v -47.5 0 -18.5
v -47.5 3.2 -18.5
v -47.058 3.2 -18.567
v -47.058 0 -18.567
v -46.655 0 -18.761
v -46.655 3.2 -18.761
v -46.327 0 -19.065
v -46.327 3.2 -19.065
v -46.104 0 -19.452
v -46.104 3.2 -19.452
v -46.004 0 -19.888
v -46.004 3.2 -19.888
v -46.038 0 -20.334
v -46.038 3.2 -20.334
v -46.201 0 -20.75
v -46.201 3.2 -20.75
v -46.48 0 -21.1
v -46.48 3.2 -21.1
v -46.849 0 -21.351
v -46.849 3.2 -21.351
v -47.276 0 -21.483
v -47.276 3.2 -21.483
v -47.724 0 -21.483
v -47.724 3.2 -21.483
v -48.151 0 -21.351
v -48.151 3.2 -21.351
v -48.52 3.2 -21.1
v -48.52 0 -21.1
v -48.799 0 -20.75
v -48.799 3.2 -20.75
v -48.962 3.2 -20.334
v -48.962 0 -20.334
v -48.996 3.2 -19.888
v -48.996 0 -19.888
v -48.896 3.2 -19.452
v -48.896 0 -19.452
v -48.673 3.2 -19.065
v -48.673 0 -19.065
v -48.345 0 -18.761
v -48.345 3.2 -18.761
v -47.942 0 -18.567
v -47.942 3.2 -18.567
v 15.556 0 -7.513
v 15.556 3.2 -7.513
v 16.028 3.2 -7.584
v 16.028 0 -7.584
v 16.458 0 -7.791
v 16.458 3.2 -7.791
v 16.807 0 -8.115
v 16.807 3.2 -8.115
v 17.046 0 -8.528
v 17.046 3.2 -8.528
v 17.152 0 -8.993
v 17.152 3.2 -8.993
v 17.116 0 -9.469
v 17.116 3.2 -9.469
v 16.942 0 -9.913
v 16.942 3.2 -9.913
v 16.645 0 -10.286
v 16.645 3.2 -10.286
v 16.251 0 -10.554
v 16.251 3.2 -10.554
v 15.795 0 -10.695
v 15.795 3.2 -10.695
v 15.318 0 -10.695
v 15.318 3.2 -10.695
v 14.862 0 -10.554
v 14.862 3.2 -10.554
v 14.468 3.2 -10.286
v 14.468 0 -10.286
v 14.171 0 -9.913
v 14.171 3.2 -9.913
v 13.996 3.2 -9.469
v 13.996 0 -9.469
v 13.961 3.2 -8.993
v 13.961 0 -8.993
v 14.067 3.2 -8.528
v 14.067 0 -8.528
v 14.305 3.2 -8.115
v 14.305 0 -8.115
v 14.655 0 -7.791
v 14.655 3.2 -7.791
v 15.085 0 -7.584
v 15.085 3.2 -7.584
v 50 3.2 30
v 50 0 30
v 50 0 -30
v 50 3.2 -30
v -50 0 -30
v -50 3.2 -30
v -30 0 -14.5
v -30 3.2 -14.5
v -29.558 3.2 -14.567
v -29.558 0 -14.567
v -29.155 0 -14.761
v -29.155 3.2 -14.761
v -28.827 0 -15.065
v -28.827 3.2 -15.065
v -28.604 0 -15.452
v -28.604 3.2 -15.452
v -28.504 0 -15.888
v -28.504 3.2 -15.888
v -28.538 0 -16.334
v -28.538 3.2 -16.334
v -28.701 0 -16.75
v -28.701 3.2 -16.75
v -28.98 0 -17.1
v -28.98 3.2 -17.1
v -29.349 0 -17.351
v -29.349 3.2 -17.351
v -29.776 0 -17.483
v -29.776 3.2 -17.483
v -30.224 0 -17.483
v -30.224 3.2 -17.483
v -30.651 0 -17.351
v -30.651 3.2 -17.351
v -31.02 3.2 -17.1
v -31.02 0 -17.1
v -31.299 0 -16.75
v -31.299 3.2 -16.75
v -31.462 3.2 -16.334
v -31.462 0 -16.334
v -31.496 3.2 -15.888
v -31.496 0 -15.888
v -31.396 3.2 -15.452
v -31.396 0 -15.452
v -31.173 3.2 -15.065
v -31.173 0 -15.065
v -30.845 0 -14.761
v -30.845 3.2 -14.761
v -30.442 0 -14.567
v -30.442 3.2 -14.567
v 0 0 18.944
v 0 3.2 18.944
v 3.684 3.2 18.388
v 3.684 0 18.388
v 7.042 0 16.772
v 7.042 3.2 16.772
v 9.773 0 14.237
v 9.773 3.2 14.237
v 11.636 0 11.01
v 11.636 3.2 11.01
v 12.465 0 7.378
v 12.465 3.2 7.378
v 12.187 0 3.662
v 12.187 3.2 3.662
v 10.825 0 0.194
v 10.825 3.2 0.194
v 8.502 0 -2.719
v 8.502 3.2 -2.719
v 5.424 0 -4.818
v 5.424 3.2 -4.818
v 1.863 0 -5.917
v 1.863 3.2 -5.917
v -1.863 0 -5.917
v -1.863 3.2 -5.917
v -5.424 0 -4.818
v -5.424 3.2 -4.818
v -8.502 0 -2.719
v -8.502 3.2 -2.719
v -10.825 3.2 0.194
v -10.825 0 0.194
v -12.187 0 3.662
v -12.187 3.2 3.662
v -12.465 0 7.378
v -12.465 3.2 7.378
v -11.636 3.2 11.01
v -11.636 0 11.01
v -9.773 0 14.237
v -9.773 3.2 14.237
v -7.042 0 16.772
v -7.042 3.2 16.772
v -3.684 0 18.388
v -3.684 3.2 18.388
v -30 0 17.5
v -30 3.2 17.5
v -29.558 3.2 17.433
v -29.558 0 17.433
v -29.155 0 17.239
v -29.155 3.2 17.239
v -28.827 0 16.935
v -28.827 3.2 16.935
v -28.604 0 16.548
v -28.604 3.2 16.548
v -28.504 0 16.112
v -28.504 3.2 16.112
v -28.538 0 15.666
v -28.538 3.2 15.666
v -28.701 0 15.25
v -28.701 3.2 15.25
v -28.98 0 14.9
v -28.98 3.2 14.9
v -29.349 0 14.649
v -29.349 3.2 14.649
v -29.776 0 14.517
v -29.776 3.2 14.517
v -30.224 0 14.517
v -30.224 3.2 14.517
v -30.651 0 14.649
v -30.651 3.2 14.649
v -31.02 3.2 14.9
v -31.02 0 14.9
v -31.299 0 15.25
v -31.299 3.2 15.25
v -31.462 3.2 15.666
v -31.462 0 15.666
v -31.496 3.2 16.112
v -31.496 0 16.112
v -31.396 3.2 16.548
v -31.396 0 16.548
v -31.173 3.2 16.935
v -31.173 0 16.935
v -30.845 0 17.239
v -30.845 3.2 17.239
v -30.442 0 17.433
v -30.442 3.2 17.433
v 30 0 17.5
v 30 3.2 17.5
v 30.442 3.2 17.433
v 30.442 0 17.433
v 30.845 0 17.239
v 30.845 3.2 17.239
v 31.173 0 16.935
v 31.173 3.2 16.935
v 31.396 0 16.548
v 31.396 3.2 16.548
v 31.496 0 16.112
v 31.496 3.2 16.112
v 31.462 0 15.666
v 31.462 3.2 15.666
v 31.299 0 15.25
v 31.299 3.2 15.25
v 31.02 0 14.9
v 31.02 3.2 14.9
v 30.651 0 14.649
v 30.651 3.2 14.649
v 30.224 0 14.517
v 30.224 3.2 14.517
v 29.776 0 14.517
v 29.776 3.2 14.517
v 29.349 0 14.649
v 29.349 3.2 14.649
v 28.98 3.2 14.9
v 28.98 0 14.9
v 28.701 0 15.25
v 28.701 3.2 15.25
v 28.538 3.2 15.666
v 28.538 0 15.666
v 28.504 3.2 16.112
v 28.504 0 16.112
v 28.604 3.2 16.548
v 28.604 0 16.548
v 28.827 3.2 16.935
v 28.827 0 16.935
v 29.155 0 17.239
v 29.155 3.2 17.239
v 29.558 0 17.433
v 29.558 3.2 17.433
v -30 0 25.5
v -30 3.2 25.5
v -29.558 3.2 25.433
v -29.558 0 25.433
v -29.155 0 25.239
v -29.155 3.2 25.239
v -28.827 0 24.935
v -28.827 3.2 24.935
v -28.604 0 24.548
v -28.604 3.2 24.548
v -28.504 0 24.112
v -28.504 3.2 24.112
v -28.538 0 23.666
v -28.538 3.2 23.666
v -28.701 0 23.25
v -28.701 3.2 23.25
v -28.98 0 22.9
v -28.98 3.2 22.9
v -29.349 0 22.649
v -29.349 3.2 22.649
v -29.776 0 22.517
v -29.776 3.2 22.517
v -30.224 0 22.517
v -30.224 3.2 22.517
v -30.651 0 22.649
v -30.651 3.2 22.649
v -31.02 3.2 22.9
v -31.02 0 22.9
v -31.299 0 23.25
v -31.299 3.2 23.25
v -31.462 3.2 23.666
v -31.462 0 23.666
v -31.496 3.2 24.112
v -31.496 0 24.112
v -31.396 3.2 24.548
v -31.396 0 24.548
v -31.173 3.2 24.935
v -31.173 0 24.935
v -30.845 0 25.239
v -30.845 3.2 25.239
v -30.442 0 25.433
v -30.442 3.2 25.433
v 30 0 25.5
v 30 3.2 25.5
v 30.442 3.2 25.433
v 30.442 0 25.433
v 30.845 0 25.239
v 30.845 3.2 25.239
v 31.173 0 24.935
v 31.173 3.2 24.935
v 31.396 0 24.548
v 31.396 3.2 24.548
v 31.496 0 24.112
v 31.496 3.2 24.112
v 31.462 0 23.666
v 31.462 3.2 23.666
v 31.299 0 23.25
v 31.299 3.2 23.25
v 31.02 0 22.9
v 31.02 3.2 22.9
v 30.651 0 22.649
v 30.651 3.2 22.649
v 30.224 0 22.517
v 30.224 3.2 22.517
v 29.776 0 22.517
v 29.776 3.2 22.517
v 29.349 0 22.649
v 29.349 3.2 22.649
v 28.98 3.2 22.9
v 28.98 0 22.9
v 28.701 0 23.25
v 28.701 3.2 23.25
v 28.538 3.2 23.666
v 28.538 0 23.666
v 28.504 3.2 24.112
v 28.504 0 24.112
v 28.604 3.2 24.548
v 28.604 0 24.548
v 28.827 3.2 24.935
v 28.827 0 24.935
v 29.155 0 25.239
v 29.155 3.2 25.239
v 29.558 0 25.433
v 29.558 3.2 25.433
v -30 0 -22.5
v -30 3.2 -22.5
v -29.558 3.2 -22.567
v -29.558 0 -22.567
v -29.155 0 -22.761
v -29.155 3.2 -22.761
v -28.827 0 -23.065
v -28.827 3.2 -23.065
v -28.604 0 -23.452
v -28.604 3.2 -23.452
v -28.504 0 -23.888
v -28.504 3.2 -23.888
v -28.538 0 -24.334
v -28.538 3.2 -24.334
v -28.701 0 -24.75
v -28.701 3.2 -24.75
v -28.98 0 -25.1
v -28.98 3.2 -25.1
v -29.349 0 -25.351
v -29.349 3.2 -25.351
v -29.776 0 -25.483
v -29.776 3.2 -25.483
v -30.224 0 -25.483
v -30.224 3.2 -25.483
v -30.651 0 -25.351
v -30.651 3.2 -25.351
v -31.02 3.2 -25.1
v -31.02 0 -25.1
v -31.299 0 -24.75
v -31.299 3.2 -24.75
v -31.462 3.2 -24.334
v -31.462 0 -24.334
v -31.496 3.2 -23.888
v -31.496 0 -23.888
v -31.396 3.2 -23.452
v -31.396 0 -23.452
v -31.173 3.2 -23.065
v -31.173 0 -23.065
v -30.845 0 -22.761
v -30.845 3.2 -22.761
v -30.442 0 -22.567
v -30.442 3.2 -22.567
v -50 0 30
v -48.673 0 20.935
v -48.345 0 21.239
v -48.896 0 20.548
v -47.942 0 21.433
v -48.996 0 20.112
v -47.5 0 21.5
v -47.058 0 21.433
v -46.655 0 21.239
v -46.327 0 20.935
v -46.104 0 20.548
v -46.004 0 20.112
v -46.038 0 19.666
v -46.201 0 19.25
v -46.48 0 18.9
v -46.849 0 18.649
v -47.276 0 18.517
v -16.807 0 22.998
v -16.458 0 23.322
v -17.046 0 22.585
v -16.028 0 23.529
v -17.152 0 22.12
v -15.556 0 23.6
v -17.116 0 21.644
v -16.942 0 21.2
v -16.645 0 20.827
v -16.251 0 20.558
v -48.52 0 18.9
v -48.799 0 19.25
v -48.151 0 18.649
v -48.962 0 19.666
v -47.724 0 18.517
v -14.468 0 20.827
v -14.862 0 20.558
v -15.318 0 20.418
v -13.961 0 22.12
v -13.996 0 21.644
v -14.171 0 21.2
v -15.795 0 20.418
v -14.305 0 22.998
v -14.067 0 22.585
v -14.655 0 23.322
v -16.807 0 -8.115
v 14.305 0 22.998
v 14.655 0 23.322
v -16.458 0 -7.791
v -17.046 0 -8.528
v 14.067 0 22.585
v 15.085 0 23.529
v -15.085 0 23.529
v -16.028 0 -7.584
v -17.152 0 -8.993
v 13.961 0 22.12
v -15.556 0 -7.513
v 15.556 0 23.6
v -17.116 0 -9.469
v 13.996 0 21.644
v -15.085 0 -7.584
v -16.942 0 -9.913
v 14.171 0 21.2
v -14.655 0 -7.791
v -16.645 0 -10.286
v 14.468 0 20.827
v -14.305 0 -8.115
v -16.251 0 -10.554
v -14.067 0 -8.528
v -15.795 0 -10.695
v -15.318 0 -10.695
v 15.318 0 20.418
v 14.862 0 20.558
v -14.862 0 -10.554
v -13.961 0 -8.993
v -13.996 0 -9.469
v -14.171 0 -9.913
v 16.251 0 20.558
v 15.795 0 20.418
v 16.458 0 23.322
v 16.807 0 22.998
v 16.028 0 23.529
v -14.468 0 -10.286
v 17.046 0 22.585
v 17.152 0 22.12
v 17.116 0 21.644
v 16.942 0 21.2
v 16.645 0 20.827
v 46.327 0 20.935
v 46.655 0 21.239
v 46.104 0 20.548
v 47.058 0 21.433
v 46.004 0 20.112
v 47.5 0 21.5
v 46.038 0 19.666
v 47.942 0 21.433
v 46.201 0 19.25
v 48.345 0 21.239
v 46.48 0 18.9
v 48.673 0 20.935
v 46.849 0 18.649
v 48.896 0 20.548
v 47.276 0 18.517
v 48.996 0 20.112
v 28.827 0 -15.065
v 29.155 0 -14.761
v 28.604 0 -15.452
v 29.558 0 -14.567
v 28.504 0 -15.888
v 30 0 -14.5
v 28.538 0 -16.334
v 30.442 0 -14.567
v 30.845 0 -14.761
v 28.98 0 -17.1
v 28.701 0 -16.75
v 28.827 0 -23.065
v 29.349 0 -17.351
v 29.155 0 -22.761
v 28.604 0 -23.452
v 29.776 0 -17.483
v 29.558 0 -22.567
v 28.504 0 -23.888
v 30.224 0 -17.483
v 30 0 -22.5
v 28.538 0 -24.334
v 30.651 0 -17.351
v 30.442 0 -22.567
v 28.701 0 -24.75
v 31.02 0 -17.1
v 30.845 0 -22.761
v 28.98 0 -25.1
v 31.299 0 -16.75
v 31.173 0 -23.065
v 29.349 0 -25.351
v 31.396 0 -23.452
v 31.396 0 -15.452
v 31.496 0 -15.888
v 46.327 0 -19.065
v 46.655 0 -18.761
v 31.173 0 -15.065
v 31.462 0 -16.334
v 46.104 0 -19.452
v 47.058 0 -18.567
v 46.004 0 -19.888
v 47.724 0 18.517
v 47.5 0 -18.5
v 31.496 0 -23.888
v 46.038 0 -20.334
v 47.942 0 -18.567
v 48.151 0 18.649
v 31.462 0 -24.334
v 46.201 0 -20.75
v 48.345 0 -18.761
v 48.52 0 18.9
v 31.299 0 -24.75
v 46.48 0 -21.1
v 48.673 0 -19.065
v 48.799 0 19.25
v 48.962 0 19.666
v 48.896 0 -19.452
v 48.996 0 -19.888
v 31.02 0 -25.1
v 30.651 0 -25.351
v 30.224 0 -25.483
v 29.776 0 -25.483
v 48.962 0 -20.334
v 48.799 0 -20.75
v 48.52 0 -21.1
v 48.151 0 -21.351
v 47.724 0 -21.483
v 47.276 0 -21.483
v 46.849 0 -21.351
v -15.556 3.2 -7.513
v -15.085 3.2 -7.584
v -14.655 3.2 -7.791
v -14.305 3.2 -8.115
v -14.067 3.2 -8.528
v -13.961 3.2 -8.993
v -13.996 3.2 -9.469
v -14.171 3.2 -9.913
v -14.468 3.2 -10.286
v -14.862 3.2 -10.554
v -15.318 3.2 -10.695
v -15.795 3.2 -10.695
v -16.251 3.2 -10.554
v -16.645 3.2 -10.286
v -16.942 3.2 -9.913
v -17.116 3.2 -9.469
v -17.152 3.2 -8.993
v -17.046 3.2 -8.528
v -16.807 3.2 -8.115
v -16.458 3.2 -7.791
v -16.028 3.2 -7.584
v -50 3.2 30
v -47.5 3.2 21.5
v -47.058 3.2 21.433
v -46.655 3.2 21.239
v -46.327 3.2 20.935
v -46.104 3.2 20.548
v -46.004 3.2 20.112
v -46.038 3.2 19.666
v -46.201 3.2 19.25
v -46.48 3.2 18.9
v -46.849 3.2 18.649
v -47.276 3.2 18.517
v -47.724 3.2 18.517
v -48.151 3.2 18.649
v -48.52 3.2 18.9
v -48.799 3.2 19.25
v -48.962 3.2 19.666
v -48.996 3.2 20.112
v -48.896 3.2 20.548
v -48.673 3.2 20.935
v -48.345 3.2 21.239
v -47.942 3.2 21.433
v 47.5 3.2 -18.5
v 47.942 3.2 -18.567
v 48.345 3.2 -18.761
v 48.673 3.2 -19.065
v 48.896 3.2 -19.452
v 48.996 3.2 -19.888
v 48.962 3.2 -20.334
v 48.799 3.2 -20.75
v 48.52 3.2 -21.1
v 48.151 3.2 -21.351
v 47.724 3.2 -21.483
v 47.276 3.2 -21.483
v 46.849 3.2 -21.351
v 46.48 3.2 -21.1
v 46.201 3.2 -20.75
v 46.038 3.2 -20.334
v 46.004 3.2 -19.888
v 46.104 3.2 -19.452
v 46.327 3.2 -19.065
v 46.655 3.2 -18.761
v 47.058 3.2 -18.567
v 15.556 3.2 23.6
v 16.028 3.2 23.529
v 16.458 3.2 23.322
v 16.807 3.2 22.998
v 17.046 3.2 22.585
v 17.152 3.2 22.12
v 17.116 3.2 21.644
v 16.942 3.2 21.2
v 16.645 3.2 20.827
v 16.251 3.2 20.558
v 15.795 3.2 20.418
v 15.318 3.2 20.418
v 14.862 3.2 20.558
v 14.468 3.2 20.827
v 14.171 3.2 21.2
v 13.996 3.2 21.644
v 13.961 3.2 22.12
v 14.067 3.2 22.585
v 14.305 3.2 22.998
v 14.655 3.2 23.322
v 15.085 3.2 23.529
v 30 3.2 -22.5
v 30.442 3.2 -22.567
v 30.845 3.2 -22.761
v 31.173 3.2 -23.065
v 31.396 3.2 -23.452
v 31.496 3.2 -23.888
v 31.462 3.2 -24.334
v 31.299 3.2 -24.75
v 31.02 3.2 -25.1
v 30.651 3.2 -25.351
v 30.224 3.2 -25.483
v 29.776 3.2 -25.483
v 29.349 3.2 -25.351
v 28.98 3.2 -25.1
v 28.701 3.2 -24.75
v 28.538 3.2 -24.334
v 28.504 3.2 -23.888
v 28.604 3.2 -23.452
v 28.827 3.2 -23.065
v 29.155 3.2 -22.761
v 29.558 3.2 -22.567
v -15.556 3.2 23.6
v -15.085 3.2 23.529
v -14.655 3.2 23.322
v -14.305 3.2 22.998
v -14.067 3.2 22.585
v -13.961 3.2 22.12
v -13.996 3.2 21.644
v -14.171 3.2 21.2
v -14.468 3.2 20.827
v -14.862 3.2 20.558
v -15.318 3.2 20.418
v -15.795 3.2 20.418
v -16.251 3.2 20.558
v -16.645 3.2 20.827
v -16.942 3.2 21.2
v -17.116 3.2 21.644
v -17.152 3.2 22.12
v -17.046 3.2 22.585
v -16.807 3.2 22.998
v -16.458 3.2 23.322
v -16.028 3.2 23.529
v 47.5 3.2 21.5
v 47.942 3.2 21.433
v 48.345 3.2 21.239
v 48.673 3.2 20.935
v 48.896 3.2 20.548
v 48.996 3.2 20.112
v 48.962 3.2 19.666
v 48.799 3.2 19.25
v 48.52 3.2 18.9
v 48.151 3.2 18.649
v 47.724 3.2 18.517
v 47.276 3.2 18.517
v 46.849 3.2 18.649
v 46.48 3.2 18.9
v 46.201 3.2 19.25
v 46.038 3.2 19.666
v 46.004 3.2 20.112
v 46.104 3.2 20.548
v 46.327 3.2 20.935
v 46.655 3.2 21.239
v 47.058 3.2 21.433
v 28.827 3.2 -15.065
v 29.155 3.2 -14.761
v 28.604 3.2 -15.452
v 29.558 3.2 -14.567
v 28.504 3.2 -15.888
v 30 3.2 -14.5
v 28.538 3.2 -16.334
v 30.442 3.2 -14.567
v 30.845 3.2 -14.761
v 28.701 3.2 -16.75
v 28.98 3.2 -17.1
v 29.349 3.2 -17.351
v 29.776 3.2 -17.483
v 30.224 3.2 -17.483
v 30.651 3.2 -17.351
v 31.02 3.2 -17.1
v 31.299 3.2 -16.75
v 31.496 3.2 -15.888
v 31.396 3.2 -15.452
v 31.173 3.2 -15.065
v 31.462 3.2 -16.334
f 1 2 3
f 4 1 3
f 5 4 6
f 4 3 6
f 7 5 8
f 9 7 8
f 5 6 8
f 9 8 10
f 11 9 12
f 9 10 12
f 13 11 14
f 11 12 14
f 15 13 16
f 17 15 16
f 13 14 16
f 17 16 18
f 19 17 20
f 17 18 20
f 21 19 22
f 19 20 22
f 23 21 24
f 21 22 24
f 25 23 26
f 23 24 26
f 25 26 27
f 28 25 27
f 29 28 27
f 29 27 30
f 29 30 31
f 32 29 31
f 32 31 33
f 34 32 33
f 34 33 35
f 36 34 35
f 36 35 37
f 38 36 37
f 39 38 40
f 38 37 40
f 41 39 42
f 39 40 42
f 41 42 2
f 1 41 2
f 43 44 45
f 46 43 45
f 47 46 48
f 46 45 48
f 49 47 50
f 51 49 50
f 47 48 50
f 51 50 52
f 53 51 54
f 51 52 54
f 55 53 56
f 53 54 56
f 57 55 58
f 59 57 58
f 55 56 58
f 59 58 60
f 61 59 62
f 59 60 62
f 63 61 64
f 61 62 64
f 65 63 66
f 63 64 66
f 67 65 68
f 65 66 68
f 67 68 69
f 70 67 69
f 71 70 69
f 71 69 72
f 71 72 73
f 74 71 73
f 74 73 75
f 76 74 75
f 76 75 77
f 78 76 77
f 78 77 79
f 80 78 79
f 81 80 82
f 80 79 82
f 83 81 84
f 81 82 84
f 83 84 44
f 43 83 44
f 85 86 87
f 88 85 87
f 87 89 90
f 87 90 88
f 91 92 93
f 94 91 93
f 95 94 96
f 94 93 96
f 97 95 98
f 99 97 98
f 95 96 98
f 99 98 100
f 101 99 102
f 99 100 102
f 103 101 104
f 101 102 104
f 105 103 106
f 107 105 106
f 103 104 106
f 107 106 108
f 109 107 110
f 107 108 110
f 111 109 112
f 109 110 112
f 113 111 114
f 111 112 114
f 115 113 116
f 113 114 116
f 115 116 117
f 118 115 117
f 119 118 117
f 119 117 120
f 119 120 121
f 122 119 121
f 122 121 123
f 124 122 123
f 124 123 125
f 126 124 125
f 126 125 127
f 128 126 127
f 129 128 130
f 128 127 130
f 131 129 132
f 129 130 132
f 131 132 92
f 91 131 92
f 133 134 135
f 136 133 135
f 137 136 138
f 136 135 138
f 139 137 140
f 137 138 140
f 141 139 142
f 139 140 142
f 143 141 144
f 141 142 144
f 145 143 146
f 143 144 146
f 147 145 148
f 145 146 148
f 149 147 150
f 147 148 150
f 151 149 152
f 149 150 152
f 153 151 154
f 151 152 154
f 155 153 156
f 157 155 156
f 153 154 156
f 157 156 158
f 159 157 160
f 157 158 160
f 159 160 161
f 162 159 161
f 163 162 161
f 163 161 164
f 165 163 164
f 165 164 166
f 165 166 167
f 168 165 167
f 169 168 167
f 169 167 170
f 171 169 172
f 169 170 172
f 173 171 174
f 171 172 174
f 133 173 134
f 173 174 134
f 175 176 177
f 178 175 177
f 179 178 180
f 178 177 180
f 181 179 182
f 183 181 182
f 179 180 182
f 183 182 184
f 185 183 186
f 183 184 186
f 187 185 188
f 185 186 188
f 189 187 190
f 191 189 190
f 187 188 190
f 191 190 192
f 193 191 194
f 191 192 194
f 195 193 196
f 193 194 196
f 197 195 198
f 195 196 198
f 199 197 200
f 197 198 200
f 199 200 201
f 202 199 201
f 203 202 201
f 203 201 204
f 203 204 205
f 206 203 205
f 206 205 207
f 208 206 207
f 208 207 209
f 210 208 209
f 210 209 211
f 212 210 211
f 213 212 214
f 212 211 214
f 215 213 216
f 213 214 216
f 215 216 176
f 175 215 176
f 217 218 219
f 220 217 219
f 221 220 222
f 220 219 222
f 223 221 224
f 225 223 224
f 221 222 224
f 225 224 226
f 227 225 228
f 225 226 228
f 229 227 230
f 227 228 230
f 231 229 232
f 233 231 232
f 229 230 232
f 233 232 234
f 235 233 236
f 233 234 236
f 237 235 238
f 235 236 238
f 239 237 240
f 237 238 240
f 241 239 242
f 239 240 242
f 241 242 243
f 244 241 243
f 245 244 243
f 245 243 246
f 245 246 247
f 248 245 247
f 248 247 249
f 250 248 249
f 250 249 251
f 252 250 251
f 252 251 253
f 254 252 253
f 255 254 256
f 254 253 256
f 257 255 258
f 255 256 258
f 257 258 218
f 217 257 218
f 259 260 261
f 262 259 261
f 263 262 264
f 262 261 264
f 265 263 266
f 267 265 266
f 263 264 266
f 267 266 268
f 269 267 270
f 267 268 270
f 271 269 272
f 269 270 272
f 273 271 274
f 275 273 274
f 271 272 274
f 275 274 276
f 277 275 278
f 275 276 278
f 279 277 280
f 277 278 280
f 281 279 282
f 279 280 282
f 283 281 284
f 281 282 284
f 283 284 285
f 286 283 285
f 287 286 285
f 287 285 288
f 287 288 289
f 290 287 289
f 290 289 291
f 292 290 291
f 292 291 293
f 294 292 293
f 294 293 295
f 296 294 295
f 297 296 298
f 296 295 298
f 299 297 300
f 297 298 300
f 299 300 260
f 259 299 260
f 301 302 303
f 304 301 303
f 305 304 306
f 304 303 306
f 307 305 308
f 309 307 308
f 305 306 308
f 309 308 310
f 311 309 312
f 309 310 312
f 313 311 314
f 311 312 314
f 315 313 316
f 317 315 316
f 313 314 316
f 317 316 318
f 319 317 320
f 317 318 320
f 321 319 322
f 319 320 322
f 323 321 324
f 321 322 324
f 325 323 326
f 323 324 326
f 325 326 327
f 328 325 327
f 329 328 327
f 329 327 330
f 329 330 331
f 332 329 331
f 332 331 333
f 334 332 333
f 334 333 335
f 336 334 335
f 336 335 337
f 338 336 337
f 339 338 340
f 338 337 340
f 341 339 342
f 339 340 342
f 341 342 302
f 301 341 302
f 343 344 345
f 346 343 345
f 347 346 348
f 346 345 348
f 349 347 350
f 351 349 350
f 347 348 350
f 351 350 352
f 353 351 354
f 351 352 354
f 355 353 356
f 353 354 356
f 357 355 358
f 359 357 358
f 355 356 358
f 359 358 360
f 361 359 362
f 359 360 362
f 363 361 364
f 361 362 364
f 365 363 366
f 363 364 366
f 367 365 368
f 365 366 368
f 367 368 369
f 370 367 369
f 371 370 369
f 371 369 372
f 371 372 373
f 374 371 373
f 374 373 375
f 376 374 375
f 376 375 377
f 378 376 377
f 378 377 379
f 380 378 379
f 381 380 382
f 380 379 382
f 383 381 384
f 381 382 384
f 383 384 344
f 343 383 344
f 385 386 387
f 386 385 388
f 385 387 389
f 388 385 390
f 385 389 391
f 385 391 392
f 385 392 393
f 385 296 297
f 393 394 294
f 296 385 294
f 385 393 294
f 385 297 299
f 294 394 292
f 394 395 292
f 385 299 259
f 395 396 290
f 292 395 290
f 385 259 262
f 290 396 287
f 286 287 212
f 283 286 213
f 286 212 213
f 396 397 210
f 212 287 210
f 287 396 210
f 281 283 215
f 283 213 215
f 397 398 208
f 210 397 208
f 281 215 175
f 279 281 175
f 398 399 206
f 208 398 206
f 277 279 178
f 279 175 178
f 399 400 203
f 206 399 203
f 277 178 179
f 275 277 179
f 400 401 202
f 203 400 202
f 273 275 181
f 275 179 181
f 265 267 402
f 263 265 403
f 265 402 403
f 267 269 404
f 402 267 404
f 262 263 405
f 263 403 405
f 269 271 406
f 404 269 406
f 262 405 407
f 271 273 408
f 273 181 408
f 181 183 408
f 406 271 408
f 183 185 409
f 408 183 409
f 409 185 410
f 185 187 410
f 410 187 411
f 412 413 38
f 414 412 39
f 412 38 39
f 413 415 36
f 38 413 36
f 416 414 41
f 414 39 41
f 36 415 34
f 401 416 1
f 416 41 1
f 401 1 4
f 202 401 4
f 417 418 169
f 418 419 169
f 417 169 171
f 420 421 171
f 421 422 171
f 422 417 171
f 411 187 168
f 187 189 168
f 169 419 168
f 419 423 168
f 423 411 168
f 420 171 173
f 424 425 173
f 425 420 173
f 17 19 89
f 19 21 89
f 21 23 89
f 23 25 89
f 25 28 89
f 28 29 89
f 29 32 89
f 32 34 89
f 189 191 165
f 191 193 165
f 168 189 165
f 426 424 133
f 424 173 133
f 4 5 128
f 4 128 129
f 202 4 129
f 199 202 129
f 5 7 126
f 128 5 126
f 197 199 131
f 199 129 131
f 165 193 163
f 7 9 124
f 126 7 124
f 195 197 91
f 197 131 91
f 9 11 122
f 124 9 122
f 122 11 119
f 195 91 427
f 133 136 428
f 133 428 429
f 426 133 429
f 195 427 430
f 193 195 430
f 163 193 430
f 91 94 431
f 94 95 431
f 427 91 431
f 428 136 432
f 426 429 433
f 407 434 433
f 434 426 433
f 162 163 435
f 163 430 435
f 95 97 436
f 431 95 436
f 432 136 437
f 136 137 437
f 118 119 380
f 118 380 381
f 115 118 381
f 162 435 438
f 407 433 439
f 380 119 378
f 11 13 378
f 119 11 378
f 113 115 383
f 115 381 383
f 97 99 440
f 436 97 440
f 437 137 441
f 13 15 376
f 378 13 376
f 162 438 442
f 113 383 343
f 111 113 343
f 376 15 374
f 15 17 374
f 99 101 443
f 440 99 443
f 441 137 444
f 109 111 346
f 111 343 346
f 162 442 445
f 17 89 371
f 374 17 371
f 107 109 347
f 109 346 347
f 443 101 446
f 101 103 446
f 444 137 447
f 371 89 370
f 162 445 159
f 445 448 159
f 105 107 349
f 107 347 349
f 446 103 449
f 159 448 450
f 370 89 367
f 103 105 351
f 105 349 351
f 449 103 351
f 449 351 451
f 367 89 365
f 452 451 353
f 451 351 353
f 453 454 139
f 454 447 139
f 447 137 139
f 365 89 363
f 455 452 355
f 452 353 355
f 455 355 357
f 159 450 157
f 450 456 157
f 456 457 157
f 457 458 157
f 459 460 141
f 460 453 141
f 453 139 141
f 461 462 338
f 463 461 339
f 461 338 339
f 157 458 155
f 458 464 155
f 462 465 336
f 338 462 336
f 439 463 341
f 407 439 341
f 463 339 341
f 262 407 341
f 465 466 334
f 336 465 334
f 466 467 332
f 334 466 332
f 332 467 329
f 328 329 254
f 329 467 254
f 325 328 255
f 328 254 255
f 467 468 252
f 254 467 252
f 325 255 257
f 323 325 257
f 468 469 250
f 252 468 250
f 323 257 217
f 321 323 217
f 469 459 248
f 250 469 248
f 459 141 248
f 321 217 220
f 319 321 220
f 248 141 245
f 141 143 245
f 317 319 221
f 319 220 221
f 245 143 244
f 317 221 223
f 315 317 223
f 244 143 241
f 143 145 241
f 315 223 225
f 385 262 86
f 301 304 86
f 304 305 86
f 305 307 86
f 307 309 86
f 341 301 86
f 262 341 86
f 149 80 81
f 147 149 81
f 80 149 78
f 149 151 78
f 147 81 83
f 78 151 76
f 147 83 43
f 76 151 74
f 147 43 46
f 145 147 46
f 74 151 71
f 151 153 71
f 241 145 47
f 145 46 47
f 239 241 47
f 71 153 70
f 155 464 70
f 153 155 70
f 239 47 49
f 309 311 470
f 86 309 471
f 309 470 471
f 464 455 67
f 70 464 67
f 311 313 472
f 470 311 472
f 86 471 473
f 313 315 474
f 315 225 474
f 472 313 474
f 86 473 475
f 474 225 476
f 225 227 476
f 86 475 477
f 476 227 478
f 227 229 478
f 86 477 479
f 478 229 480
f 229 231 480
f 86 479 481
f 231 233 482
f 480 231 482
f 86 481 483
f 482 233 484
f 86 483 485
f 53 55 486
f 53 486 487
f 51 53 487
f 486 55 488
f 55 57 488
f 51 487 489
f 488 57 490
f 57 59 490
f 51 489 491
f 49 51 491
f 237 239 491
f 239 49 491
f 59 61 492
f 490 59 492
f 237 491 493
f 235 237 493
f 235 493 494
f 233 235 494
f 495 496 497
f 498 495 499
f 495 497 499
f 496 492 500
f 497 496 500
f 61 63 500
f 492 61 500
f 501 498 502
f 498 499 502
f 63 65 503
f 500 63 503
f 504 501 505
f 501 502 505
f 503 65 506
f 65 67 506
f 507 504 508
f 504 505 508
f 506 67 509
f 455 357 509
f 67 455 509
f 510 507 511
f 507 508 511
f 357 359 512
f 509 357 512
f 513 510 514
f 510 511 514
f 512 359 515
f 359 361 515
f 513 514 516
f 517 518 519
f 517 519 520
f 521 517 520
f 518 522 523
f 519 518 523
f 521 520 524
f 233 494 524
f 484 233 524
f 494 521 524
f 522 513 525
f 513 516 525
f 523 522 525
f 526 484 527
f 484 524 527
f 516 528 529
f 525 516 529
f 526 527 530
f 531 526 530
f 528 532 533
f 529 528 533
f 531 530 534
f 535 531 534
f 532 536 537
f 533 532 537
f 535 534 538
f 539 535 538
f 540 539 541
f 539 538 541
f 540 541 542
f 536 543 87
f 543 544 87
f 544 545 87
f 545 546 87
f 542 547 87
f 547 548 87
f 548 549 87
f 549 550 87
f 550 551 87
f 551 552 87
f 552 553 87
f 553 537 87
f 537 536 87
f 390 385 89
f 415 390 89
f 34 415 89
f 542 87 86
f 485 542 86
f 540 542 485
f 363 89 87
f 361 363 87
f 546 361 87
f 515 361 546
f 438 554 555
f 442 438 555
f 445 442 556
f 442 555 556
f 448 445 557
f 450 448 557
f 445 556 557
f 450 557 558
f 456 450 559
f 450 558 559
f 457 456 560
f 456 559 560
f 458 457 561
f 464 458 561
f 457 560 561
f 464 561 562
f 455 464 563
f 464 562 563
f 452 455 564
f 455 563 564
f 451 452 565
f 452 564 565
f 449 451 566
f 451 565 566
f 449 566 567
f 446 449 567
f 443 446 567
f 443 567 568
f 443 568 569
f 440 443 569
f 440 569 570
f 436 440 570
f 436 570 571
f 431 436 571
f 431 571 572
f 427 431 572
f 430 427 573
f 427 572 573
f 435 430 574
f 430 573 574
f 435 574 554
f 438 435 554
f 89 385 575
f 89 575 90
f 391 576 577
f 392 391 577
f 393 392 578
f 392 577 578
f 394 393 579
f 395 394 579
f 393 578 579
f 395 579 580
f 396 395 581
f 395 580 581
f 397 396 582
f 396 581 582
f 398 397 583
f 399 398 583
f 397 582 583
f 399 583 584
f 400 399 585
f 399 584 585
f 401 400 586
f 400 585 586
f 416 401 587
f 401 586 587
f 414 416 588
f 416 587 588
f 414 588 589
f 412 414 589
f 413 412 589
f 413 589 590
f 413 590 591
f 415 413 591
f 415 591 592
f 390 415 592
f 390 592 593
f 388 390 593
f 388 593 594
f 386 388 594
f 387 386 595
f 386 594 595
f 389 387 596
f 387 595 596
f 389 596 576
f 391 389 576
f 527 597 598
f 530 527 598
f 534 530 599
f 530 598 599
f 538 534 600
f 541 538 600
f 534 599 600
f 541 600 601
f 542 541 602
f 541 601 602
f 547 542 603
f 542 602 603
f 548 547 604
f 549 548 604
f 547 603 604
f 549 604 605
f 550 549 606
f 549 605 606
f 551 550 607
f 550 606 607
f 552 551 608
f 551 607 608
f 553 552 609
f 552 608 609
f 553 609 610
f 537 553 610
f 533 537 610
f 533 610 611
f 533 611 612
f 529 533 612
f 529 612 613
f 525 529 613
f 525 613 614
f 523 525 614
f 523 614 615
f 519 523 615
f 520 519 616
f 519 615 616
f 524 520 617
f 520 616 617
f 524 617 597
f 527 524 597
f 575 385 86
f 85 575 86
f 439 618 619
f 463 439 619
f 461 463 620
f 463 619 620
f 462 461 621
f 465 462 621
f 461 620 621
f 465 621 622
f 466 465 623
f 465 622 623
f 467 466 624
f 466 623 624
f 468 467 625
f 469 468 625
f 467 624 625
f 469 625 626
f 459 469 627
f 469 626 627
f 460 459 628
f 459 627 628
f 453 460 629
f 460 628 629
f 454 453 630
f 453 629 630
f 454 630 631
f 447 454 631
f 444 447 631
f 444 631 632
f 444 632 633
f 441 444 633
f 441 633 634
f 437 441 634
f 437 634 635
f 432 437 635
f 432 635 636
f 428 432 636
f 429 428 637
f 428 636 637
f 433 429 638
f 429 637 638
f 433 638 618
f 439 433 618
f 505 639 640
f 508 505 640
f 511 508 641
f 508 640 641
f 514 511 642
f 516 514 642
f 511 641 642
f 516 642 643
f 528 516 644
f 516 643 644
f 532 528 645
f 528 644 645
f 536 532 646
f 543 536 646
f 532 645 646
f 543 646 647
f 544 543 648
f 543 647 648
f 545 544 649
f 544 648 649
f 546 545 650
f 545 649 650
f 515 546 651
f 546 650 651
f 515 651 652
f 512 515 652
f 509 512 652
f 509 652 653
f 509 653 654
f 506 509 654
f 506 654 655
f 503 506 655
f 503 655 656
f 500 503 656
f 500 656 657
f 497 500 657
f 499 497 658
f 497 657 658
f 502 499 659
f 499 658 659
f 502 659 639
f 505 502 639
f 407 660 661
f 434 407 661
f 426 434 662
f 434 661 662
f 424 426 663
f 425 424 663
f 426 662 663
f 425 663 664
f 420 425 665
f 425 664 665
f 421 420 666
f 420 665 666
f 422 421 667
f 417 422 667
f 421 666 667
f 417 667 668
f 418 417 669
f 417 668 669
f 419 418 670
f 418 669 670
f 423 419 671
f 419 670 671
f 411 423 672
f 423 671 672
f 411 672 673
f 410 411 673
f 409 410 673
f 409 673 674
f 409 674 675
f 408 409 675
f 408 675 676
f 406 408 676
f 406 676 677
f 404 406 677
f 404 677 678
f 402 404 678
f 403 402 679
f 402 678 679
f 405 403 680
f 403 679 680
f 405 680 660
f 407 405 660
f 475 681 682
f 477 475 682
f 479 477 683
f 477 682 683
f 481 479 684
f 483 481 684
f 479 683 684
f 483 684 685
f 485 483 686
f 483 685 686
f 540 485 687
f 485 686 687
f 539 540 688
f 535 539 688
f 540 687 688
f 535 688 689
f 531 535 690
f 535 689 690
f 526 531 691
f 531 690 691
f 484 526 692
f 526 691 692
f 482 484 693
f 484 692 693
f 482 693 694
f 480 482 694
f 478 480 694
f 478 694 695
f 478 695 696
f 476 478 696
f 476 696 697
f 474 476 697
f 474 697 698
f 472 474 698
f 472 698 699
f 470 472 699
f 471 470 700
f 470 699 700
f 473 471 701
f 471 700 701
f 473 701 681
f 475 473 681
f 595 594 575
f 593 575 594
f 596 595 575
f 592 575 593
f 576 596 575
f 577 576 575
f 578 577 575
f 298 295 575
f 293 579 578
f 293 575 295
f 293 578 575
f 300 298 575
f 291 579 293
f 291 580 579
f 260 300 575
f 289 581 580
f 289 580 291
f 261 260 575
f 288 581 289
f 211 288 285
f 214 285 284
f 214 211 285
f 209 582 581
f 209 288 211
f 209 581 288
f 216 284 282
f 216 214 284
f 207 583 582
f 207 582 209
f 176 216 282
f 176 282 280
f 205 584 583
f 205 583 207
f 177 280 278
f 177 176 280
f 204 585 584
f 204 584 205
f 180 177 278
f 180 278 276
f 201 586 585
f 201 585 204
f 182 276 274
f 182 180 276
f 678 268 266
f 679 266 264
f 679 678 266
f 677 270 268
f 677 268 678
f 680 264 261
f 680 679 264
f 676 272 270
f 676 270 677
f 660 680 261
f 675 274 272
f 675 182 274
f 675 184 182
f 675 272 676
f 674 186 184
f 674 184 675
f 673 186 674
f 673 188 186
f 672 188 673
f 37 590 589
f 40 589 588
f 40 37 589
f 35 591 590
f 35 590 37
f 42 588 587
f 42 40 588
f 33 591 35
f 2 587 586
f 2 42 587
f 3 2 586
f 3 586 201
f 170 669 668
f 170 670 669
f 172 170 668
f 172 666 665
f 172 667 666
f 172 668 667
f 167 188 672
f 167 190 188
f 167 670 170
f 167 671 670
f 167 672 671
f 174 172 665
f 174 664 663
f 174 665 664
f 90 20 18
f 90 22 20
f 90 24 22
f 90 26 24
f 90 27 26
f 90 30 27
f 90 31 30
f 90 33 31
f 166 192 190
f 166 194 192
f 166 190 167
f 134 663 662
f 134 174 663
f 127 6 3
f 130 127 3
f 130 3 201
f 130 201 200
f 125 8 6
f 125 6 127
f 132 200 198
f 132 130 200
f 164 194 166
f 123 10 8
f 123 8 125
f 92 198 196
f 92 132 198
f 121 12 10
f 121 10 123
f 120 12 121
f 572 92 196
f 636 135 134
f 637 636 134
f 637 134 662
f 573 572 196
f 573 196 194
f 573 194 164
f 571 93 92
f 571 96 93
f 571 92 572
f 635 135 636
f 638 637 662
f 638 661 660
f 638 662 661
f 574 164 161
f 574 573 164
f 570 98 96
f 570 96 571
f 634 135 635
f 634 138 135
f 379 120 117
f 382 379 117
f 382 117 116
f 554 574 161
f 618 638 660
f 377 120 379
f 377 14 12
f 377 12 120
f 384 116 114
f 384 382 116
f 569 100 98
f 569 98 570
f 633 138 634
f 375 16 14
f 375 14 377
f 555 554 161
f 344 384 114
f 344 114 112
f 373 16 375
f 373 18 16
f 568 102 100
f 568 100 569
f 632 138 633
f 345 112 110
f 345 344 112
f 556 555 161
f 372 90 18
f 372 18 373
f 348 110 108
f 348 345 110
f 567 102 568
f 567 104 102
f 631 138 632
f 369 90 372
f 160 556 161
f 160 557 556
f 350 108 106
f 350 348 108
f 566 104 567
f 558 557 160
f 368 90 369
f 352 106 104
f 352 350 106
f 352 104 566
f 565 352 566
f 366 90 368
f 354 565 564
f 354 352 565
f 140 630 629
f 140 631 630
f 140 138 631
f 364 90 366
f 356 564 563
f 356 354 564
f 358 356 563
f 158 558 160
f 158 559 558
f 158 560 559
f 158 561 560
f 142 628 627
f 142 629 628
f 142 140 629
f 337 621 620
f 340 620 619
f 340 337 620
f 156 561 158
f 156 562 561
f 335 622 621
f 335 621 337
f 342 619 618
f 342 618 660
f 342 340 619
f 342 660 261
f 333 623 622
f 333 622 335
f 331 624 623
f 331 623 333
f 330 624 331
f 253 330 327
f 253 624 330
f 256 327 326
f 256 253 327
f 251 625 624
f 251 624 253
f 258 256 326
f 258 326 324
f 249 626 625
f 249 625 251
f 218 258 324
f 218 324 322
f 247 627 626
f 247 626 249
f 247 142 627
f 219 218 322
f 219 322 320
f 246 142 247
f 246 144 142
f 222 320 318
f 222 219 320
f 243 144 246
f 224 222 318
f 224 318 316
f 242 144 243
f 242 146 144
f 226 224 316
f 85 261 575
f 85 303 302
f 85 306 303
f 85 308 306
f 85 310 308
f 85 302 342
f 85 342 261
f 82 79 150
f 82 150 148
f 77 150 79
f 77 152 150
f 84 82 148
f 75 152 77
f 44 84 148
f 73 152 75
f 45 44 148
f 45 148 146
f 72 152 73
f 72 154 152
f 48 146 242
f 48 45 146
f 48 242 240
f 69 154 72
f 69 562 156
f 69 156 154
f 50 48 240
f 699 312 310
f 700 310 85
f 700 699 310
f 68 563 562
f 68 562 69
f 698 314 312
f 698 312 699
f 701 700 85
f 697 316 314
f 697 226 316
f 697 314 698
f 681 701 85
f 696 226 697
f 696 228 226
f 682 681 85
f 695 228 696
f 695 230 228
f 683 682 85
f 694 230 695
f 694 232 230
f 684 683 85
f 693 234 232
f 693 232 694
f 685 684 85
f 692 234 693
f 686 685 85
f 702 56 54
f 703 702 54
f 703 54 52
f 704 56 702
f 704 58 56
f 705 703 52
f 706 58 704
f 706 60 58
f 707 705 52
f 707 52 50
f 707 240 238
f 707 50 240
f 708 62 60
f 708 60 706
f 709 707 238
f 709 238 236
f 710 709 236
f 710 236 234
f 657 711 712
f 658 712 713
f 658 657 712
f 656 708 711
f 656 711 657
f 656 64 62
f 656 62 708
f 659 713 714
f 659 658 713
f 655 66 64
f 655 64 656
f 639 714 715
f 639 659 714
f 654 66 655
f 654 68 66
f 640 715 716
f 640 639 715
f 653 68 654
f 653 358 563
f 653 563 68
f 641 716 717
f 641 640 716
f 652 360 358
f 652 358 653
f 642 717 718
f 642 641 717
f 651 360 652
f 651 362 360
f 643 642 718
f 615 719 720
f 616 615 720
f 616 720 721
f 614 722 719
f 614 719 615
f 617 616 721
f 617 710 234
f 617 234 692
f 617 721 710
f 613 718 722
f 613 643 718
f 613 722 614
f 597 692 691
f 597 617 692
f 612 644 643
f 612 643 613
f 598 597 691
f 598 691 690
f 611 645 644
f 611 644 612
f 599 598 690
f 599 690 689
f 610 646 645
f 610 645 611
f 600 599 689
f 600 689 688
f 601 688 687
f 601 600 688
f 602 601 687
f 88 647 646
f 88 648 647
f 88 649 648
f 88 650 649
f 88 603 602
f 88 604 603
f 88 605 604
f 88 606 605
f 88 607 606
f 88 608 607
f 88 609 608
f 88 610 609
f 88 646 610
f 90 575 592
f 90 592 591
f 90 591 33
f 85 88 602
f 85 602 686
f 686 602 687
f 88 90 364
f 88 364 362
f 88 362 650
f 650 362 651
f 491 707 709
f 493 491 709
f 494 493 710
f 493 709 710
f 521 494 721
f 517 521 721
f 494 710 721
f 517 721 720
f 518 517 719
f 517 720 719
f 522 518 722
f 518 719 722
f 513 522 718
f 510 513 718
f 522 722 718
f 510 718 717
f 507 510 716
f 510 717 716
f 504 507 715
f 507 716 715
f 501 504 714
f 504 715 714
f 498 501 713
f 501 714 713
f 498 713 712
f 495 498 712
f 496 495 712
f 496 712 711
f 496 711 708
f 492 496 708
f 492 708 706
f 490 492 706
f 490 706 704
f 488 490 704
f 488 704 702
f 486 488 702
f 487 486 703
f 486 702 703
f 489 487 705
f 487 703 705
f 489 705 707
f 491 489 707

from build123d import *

# Parameters (mm, degrees)
SKETCH_1_W          = 100
SKETCH_1_H          = 60
EXTRUDE_1_DEPTH     = 3.2
SKETCH_2_R          = 12.5
SKETCH_2_R_2        = 1.6
SKETCH_2_R_3        = 1.5
CUT_EXTRUDE_1_DEPTH = 3.2


with BuildPart() as part:
    # 草图1 → 凸台-拉伸1 (new body)
    with BuildSketch(Plane(origin=(0, 0, 0), x_dir=(1, 0, 0), z_dir=(0, 1, 0))):
        Rectangle(SKETCH_1_W, SKETCH_1_H)
    extrude(amount=EXTRUDE_1_DEPTH)

    # 草图2 → 切除-拉伸1 (cut)
    with BuildSketch(Plane(origin=(0, 3.2, 0), x_dir=(1, 0, 0), z_dir=(0, 1, 0))):
        with Locations(Location((0, -6.443650814, 0), (0, 0, 270))):
            Circle(SKETCH_2_R)
        with Locations(Location((15.556349186, -22, 0), (0, 0, 270))):
            Circle(SKETCH_2_R_2)
        with Locations(Location((15.556349186, 9.112698372, 0), (0, 0, 270))):
            Circle(SKETCH_2_R_2)
        with Locations(Location((-15.556349186, 9.112698372, 0), (0, 0, 270))):
            Circle(SKETCH_2_R_2)
        with Locations(Location((-15.556349186, -22, 0), (0, 0, 270))):
            Circle(SKETCH_2_R_2)
        with Locations(Location((-47.5, 20, 0), (0, 0, 270))):
            Circle(SKETCH_2_R_3)
        with Locations(Location((-47.5, -20, 0), (0, 0, 270))):
            Circle(SKETCH_2_R_3)
        with Locations(Location((47.5, -20, 0), (0, 0, 270))):
            Circle(SKETCH_2_R_3)
        with Locations(Location((47.5, 20, 0), (0, 0, 270))):
            Circle(SKETCH_2_R_3)
        with Locations(Location((-30, -24, 0), (0, 0, 270))):
            Circle(SKETCH_2_R_3)
        with Locations(Location((-30, -16, 0), (0, 0, 270))):
            Circle(SKETCH_2_R_3)
        with Locations(Location((-30, 24, 0), (0, 0, 270))):
            Circle(SKETCH_2_R_3)
        with Locations(Location((-30, 16, 0), (0, 0, 270))):
            Circle(SKETCH_2_R_3)
        with Locations(Location((30, -24, 0), (0, 0, 270))):
            Circle(SKETCH_2_R_3)
        with Locations(Location((30, -16, 0), (0, 0, 270))):
            Circle(SKETCH_2_R_3)
        with Locations(Location((30, 24, 0), (0, 0, 270))):
            Circle(SKETCH_2_R_3)
        with Locations(Location((30, 16, 0), (0, 0, 270))):
            Circle(SKETCH_2_R_3)
    extrude(amount=-CUT_EXTRUDE_1_DEPTH, mode=Mode.SUBTRACT)


solid = part.part
